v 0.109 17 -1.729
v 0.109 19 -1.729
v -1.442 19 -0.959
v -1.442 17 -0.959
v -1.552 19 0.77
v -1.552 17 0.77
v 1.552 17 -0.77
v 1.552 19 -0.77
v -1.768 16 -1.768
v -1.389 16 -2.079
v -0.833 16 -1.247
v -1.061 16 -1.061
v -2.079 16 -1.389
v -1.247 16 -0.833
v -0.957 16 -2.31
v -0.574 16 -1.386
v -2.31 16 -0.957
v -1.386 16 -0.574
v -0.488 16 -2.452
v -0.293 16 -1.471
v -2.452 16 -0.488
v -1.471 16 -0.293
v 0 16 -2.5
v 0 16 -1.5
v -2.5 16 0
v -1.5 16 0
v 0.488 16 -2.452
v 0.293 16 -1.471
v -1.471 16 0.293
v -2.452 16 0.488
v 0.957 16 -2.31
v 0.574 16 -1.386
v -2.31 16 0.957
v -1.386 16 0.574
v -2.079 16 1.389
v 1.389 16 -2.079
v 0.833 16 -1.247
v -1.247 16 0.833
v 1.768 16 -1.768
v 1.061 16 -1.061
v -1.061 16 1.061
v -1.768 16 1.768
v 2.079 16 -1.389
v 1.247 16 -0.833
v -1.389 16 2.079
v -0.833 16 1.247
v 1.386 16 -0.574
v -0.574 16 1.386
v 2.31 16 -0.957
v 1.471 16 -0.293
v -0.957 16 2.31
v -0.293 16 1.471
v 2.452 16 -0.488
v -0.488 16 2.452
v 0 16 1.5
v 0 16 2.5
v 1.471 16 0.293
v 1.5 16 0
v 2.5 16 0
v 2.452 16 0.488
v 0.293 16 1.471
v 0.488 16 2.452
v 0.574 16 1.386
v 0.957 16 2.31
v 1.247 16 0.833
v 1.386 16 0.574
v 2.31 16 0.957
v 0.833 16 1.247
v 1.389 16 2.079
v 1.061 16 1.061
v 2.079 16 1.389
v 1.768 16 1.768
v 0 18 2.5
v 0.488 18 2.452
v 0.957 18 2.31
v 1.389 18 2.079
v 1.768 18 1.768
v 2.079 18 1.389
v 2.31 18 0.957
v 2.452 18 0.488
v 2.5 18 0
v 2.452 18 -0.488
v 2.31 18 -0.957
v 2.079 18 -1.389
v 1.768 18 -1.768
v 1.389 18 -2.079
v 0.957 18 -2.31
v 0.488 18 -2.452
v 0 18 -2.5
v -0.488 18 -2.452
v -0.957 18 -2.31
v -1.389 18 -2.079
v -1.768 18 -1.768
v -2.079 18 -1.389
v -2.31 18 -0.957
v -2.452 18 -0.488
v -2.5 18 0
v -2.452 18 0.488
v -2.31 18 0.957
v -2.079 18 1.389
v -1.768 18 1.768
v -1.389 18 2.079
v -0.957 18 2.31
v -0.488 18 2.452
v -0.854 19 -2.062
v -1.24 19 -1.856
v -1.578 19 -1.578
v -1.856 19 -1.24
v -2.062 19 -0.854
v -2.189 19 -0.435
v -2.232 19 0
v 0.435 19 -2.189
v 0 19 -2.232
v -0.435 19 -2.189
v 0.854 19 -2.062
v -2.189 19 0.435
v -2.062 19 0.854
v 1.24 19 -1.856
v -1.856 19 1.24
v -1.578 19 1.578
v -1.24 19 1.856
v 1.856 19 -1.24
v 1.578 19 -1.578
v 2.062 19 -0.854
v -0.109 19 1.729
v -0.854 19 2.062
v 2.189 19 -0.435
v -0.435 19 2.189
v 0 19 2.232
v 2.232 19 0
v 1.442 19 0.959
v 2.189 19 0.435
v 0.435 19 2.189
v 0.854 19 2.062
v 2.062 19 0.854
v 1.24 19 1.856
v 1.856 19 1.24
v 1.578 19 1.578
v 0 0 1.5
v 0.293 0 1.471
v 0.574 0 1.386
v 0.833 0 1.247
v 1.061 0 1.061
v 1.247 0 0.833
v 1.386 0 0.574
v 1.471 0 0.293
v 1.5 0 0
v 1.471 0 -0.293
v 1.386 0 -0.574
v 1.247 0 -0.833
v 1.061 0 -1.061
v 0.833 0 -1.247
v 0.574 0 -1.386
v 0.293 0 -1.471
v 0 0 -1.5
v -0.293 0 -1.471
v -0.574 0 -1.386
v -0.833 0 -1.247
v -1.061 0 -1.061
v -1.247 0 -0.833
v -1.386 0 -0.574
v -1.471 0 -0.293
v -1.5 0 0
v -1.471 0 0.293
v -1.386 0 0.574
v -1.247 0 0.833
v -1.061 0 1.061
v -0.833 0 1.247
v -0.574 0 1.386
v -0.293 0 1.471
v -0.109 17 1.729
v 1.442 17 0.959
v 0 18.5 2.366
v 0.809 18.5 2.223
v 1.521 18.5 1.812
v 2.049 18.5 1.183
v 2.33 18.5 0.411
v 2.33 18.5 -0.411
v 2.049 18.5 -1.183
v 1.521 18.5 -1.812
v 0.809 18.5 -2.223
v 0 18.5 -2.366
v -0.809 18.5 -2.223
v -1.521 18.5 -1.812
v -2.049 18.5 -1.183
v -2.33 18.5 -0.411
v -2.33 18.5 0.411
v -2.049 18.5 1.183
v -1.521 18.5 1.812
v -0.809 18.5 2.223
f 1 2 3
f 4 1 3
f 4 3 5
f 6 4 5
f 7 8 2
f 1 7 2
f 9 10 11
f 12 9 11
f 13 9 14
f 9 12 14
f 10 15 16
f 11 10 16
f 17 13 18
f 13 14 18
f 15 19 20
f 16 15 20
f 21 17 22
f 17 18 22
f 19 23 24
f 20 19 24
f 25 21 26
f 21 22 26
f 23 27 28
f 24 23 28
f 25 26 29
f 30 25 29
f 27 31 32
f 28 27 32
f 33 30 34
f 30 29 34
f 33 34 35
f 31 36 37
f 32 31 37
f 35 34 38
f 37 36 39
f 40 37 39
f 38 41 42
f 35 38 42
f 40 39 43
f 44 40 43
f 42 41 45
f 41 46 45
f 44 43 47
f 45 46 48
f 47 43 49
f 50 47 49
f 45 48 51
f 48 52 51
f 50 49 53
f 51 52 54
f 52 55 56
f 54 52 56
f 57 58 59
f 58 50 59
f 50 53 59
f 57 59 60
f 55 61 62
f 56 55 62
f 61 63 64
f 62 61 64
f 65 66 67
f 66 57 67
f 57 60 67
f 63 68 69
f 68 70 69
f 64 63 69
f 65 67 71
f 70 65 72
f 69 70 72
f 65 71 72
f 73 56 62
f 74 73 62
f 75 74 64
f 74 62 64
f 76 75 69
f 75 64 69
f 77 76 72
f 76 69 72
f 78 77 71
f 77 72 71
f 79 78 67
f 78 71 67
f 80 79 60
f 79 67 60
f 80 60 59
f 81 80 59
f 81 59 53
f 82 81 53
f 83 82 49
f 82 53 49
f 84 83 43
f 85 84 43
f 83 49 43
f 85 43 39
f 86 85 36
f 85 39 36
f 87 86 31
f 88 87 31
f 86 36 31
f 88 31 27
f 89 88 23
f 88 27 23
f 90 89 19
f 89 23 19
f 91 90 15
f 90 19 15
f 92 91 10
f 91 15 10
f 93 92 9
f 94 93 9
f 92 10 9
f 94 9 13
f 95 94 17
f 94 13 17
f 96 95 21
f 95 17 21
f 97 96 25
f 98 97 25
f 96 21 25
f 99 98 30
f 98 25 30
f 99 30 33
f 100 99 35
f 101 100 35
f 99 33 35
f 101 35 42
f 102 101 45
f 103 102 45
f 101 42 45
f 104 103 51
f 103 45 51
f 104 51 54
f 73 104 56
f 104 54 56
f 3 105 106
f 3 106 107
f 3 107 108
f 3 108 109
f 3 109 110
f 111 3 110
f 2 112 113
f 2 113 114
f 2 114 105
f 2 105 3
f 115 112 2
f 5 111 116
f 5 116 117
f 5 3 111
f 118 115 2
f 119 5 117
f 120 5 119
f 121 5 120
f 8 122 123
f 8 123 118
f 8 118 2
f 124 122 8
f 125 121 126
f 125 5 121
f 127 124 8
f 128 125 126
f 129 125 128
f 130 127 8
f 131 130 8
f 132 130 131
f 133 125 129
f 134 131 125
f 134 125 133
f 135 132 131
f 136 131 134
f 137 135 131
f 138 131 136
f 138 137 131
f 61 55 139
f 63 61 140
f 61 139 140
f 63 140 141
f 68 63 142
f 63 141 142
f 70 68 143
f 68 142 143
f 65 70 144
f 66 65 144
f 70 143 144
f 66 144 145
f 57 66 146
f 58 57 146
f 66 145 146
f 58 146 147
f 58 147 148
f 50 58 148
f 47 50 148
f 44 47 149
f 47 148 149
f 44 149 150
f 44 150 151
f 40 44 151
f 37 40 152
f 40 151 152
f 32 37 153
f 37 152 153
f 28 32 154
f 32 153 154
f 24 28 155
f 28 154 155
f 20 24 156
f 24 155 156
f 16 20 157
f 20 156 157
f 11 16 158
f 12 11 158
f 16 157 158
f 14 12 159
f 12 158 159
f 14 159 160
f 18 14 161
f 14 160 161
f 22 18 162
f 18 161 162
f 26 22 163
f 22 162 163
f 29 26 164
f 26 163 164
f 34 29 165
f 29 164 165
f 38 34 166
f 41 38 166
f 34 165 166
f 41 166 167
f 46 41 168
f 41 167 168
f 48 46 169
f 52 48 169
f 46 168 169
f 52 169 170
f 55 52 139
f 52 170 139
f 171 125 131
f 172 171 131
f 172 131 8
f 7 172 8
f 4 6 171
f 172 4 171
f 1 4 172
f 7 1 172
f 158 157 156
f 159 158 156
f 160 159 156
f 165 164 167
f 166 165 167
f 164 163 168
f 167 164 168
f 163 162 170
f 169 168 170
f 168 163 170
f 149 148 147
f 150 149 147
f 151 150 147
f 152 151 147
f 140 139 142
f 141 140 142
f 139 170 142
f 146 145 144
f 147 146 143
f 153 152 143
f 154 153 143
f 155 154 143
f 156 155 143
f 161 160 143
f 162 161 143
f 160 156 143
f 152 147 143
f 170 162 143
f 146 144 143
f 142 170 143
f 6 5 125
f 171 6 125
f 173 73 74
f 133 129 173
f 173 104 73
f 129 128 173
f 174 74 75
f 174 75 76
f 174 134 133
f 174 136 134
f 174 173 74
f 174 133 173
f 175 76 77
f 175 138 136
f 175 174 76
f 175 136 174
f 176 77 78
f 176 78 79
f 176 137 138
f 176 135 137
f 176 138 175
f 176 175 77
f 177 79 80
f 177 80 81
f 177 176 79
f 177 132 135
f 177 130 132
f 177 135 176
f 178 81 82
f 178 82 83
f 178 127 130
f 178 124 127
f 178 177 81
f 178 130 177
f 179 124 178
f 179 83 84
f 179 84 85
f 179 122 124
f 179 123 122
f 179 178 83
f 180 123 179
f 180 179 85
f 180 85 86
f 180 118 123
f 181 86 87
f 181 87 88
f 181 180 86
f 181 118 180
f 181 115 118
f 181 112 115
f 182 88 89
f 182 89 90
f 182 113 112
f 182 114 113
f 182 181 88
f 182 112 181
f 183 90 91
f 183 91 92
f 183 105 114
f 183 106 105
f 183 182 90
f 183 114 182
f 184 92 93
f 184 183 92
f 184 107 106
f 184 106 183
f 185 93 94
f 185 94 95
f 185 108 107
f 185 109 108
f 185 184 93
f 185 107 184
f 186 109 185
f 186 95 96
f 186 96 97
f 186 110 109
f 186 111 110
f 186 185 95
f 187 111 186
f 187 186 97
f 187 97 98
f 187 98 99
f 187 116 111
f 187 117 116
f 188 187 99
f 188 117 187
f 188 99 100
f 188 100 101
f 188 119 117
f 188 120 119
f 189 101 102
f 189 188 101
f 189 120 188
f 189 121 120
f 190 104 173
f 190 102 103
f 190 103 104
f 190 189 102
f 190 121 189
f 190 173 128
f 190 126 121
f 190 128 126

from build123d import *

# Parameters (mm, degrees)
SKICA1_R                 = 1.5
P_IDAT_VYSUNUT_M1_DEPTH  = 16
SKICA2_R                 = 2.5
P_IDAT_VYSUNUT_M2_DEPTH  = 3
ZKOSEN_1_SIZE            = 1
ZKOSEN_1_SIZE2           = 0.267949192
ODEBRAT_VYSUNUT_M1_DEPTH = 2


with BuildPart() as part:
    # Skica1 → Přidat vysunutím1 (new body)
    with BuildSketch(Plane(origin=(0, 0, 0), x_dir=(1, 0, 0), z_dir=(0, 1, 0))):
        with Locations(Location((0, 0, 0), (0, 0, 270))):
            Circle(SKICA1_R)
    extrude(amount=P_IDAT_VYSUNUT_M1_DEPTH)

    # Skica2 → Přidat vysunutím2 (add)
    with BuildSketch(Plane(origin=(0, 16, 0), x_dir=(1, 0, 0), z_dir=(0, 1, 0))):
        with Locations(Location((0, 0, 0), (0, 0, 270))):
            Circle(SKICA2_R)
    extrude(amount=P_IDAT_VYSUNUT_M2_DEPTH)

    # Zkosení1
    zkosen_1_edges = [part.edges().sort_by_distance(p)[0] for p in [
        (0, 19, -2.5),
    ]]
    zkosen_1_side = [part.faces().sort_by_distance(p)[0] for p in [
        (0, 17.5, -2.5),
    ]]
    chamfer(zkosen_1_edges, length=ZKOSEN_1_SIZE, length2=ZKOSEN_1_SIZE2, reference=zkosen_1_side[0])

    # Skica3 → Odebrat vysunutím1 (cut)
    with BuildSketch(Plane(origin=(0, 19, 0), x_dir=(1, 0, 0), z_dir=(0, 1, 0))):
        Polygon((-0.109437804, -1.728589994), (1.442283945, -0.959070916), (1.55172175, 0.769519078), (0.109437804, 1.728589994), (-1.442283945, 0.959070916), (-1.55172175, -0.769519078), align=None)
    extrude(amount=-ODEBRAT_VYSUNUT_M1_DEPTH, mode=Mode.SUBTRACT)


solid = part.part
